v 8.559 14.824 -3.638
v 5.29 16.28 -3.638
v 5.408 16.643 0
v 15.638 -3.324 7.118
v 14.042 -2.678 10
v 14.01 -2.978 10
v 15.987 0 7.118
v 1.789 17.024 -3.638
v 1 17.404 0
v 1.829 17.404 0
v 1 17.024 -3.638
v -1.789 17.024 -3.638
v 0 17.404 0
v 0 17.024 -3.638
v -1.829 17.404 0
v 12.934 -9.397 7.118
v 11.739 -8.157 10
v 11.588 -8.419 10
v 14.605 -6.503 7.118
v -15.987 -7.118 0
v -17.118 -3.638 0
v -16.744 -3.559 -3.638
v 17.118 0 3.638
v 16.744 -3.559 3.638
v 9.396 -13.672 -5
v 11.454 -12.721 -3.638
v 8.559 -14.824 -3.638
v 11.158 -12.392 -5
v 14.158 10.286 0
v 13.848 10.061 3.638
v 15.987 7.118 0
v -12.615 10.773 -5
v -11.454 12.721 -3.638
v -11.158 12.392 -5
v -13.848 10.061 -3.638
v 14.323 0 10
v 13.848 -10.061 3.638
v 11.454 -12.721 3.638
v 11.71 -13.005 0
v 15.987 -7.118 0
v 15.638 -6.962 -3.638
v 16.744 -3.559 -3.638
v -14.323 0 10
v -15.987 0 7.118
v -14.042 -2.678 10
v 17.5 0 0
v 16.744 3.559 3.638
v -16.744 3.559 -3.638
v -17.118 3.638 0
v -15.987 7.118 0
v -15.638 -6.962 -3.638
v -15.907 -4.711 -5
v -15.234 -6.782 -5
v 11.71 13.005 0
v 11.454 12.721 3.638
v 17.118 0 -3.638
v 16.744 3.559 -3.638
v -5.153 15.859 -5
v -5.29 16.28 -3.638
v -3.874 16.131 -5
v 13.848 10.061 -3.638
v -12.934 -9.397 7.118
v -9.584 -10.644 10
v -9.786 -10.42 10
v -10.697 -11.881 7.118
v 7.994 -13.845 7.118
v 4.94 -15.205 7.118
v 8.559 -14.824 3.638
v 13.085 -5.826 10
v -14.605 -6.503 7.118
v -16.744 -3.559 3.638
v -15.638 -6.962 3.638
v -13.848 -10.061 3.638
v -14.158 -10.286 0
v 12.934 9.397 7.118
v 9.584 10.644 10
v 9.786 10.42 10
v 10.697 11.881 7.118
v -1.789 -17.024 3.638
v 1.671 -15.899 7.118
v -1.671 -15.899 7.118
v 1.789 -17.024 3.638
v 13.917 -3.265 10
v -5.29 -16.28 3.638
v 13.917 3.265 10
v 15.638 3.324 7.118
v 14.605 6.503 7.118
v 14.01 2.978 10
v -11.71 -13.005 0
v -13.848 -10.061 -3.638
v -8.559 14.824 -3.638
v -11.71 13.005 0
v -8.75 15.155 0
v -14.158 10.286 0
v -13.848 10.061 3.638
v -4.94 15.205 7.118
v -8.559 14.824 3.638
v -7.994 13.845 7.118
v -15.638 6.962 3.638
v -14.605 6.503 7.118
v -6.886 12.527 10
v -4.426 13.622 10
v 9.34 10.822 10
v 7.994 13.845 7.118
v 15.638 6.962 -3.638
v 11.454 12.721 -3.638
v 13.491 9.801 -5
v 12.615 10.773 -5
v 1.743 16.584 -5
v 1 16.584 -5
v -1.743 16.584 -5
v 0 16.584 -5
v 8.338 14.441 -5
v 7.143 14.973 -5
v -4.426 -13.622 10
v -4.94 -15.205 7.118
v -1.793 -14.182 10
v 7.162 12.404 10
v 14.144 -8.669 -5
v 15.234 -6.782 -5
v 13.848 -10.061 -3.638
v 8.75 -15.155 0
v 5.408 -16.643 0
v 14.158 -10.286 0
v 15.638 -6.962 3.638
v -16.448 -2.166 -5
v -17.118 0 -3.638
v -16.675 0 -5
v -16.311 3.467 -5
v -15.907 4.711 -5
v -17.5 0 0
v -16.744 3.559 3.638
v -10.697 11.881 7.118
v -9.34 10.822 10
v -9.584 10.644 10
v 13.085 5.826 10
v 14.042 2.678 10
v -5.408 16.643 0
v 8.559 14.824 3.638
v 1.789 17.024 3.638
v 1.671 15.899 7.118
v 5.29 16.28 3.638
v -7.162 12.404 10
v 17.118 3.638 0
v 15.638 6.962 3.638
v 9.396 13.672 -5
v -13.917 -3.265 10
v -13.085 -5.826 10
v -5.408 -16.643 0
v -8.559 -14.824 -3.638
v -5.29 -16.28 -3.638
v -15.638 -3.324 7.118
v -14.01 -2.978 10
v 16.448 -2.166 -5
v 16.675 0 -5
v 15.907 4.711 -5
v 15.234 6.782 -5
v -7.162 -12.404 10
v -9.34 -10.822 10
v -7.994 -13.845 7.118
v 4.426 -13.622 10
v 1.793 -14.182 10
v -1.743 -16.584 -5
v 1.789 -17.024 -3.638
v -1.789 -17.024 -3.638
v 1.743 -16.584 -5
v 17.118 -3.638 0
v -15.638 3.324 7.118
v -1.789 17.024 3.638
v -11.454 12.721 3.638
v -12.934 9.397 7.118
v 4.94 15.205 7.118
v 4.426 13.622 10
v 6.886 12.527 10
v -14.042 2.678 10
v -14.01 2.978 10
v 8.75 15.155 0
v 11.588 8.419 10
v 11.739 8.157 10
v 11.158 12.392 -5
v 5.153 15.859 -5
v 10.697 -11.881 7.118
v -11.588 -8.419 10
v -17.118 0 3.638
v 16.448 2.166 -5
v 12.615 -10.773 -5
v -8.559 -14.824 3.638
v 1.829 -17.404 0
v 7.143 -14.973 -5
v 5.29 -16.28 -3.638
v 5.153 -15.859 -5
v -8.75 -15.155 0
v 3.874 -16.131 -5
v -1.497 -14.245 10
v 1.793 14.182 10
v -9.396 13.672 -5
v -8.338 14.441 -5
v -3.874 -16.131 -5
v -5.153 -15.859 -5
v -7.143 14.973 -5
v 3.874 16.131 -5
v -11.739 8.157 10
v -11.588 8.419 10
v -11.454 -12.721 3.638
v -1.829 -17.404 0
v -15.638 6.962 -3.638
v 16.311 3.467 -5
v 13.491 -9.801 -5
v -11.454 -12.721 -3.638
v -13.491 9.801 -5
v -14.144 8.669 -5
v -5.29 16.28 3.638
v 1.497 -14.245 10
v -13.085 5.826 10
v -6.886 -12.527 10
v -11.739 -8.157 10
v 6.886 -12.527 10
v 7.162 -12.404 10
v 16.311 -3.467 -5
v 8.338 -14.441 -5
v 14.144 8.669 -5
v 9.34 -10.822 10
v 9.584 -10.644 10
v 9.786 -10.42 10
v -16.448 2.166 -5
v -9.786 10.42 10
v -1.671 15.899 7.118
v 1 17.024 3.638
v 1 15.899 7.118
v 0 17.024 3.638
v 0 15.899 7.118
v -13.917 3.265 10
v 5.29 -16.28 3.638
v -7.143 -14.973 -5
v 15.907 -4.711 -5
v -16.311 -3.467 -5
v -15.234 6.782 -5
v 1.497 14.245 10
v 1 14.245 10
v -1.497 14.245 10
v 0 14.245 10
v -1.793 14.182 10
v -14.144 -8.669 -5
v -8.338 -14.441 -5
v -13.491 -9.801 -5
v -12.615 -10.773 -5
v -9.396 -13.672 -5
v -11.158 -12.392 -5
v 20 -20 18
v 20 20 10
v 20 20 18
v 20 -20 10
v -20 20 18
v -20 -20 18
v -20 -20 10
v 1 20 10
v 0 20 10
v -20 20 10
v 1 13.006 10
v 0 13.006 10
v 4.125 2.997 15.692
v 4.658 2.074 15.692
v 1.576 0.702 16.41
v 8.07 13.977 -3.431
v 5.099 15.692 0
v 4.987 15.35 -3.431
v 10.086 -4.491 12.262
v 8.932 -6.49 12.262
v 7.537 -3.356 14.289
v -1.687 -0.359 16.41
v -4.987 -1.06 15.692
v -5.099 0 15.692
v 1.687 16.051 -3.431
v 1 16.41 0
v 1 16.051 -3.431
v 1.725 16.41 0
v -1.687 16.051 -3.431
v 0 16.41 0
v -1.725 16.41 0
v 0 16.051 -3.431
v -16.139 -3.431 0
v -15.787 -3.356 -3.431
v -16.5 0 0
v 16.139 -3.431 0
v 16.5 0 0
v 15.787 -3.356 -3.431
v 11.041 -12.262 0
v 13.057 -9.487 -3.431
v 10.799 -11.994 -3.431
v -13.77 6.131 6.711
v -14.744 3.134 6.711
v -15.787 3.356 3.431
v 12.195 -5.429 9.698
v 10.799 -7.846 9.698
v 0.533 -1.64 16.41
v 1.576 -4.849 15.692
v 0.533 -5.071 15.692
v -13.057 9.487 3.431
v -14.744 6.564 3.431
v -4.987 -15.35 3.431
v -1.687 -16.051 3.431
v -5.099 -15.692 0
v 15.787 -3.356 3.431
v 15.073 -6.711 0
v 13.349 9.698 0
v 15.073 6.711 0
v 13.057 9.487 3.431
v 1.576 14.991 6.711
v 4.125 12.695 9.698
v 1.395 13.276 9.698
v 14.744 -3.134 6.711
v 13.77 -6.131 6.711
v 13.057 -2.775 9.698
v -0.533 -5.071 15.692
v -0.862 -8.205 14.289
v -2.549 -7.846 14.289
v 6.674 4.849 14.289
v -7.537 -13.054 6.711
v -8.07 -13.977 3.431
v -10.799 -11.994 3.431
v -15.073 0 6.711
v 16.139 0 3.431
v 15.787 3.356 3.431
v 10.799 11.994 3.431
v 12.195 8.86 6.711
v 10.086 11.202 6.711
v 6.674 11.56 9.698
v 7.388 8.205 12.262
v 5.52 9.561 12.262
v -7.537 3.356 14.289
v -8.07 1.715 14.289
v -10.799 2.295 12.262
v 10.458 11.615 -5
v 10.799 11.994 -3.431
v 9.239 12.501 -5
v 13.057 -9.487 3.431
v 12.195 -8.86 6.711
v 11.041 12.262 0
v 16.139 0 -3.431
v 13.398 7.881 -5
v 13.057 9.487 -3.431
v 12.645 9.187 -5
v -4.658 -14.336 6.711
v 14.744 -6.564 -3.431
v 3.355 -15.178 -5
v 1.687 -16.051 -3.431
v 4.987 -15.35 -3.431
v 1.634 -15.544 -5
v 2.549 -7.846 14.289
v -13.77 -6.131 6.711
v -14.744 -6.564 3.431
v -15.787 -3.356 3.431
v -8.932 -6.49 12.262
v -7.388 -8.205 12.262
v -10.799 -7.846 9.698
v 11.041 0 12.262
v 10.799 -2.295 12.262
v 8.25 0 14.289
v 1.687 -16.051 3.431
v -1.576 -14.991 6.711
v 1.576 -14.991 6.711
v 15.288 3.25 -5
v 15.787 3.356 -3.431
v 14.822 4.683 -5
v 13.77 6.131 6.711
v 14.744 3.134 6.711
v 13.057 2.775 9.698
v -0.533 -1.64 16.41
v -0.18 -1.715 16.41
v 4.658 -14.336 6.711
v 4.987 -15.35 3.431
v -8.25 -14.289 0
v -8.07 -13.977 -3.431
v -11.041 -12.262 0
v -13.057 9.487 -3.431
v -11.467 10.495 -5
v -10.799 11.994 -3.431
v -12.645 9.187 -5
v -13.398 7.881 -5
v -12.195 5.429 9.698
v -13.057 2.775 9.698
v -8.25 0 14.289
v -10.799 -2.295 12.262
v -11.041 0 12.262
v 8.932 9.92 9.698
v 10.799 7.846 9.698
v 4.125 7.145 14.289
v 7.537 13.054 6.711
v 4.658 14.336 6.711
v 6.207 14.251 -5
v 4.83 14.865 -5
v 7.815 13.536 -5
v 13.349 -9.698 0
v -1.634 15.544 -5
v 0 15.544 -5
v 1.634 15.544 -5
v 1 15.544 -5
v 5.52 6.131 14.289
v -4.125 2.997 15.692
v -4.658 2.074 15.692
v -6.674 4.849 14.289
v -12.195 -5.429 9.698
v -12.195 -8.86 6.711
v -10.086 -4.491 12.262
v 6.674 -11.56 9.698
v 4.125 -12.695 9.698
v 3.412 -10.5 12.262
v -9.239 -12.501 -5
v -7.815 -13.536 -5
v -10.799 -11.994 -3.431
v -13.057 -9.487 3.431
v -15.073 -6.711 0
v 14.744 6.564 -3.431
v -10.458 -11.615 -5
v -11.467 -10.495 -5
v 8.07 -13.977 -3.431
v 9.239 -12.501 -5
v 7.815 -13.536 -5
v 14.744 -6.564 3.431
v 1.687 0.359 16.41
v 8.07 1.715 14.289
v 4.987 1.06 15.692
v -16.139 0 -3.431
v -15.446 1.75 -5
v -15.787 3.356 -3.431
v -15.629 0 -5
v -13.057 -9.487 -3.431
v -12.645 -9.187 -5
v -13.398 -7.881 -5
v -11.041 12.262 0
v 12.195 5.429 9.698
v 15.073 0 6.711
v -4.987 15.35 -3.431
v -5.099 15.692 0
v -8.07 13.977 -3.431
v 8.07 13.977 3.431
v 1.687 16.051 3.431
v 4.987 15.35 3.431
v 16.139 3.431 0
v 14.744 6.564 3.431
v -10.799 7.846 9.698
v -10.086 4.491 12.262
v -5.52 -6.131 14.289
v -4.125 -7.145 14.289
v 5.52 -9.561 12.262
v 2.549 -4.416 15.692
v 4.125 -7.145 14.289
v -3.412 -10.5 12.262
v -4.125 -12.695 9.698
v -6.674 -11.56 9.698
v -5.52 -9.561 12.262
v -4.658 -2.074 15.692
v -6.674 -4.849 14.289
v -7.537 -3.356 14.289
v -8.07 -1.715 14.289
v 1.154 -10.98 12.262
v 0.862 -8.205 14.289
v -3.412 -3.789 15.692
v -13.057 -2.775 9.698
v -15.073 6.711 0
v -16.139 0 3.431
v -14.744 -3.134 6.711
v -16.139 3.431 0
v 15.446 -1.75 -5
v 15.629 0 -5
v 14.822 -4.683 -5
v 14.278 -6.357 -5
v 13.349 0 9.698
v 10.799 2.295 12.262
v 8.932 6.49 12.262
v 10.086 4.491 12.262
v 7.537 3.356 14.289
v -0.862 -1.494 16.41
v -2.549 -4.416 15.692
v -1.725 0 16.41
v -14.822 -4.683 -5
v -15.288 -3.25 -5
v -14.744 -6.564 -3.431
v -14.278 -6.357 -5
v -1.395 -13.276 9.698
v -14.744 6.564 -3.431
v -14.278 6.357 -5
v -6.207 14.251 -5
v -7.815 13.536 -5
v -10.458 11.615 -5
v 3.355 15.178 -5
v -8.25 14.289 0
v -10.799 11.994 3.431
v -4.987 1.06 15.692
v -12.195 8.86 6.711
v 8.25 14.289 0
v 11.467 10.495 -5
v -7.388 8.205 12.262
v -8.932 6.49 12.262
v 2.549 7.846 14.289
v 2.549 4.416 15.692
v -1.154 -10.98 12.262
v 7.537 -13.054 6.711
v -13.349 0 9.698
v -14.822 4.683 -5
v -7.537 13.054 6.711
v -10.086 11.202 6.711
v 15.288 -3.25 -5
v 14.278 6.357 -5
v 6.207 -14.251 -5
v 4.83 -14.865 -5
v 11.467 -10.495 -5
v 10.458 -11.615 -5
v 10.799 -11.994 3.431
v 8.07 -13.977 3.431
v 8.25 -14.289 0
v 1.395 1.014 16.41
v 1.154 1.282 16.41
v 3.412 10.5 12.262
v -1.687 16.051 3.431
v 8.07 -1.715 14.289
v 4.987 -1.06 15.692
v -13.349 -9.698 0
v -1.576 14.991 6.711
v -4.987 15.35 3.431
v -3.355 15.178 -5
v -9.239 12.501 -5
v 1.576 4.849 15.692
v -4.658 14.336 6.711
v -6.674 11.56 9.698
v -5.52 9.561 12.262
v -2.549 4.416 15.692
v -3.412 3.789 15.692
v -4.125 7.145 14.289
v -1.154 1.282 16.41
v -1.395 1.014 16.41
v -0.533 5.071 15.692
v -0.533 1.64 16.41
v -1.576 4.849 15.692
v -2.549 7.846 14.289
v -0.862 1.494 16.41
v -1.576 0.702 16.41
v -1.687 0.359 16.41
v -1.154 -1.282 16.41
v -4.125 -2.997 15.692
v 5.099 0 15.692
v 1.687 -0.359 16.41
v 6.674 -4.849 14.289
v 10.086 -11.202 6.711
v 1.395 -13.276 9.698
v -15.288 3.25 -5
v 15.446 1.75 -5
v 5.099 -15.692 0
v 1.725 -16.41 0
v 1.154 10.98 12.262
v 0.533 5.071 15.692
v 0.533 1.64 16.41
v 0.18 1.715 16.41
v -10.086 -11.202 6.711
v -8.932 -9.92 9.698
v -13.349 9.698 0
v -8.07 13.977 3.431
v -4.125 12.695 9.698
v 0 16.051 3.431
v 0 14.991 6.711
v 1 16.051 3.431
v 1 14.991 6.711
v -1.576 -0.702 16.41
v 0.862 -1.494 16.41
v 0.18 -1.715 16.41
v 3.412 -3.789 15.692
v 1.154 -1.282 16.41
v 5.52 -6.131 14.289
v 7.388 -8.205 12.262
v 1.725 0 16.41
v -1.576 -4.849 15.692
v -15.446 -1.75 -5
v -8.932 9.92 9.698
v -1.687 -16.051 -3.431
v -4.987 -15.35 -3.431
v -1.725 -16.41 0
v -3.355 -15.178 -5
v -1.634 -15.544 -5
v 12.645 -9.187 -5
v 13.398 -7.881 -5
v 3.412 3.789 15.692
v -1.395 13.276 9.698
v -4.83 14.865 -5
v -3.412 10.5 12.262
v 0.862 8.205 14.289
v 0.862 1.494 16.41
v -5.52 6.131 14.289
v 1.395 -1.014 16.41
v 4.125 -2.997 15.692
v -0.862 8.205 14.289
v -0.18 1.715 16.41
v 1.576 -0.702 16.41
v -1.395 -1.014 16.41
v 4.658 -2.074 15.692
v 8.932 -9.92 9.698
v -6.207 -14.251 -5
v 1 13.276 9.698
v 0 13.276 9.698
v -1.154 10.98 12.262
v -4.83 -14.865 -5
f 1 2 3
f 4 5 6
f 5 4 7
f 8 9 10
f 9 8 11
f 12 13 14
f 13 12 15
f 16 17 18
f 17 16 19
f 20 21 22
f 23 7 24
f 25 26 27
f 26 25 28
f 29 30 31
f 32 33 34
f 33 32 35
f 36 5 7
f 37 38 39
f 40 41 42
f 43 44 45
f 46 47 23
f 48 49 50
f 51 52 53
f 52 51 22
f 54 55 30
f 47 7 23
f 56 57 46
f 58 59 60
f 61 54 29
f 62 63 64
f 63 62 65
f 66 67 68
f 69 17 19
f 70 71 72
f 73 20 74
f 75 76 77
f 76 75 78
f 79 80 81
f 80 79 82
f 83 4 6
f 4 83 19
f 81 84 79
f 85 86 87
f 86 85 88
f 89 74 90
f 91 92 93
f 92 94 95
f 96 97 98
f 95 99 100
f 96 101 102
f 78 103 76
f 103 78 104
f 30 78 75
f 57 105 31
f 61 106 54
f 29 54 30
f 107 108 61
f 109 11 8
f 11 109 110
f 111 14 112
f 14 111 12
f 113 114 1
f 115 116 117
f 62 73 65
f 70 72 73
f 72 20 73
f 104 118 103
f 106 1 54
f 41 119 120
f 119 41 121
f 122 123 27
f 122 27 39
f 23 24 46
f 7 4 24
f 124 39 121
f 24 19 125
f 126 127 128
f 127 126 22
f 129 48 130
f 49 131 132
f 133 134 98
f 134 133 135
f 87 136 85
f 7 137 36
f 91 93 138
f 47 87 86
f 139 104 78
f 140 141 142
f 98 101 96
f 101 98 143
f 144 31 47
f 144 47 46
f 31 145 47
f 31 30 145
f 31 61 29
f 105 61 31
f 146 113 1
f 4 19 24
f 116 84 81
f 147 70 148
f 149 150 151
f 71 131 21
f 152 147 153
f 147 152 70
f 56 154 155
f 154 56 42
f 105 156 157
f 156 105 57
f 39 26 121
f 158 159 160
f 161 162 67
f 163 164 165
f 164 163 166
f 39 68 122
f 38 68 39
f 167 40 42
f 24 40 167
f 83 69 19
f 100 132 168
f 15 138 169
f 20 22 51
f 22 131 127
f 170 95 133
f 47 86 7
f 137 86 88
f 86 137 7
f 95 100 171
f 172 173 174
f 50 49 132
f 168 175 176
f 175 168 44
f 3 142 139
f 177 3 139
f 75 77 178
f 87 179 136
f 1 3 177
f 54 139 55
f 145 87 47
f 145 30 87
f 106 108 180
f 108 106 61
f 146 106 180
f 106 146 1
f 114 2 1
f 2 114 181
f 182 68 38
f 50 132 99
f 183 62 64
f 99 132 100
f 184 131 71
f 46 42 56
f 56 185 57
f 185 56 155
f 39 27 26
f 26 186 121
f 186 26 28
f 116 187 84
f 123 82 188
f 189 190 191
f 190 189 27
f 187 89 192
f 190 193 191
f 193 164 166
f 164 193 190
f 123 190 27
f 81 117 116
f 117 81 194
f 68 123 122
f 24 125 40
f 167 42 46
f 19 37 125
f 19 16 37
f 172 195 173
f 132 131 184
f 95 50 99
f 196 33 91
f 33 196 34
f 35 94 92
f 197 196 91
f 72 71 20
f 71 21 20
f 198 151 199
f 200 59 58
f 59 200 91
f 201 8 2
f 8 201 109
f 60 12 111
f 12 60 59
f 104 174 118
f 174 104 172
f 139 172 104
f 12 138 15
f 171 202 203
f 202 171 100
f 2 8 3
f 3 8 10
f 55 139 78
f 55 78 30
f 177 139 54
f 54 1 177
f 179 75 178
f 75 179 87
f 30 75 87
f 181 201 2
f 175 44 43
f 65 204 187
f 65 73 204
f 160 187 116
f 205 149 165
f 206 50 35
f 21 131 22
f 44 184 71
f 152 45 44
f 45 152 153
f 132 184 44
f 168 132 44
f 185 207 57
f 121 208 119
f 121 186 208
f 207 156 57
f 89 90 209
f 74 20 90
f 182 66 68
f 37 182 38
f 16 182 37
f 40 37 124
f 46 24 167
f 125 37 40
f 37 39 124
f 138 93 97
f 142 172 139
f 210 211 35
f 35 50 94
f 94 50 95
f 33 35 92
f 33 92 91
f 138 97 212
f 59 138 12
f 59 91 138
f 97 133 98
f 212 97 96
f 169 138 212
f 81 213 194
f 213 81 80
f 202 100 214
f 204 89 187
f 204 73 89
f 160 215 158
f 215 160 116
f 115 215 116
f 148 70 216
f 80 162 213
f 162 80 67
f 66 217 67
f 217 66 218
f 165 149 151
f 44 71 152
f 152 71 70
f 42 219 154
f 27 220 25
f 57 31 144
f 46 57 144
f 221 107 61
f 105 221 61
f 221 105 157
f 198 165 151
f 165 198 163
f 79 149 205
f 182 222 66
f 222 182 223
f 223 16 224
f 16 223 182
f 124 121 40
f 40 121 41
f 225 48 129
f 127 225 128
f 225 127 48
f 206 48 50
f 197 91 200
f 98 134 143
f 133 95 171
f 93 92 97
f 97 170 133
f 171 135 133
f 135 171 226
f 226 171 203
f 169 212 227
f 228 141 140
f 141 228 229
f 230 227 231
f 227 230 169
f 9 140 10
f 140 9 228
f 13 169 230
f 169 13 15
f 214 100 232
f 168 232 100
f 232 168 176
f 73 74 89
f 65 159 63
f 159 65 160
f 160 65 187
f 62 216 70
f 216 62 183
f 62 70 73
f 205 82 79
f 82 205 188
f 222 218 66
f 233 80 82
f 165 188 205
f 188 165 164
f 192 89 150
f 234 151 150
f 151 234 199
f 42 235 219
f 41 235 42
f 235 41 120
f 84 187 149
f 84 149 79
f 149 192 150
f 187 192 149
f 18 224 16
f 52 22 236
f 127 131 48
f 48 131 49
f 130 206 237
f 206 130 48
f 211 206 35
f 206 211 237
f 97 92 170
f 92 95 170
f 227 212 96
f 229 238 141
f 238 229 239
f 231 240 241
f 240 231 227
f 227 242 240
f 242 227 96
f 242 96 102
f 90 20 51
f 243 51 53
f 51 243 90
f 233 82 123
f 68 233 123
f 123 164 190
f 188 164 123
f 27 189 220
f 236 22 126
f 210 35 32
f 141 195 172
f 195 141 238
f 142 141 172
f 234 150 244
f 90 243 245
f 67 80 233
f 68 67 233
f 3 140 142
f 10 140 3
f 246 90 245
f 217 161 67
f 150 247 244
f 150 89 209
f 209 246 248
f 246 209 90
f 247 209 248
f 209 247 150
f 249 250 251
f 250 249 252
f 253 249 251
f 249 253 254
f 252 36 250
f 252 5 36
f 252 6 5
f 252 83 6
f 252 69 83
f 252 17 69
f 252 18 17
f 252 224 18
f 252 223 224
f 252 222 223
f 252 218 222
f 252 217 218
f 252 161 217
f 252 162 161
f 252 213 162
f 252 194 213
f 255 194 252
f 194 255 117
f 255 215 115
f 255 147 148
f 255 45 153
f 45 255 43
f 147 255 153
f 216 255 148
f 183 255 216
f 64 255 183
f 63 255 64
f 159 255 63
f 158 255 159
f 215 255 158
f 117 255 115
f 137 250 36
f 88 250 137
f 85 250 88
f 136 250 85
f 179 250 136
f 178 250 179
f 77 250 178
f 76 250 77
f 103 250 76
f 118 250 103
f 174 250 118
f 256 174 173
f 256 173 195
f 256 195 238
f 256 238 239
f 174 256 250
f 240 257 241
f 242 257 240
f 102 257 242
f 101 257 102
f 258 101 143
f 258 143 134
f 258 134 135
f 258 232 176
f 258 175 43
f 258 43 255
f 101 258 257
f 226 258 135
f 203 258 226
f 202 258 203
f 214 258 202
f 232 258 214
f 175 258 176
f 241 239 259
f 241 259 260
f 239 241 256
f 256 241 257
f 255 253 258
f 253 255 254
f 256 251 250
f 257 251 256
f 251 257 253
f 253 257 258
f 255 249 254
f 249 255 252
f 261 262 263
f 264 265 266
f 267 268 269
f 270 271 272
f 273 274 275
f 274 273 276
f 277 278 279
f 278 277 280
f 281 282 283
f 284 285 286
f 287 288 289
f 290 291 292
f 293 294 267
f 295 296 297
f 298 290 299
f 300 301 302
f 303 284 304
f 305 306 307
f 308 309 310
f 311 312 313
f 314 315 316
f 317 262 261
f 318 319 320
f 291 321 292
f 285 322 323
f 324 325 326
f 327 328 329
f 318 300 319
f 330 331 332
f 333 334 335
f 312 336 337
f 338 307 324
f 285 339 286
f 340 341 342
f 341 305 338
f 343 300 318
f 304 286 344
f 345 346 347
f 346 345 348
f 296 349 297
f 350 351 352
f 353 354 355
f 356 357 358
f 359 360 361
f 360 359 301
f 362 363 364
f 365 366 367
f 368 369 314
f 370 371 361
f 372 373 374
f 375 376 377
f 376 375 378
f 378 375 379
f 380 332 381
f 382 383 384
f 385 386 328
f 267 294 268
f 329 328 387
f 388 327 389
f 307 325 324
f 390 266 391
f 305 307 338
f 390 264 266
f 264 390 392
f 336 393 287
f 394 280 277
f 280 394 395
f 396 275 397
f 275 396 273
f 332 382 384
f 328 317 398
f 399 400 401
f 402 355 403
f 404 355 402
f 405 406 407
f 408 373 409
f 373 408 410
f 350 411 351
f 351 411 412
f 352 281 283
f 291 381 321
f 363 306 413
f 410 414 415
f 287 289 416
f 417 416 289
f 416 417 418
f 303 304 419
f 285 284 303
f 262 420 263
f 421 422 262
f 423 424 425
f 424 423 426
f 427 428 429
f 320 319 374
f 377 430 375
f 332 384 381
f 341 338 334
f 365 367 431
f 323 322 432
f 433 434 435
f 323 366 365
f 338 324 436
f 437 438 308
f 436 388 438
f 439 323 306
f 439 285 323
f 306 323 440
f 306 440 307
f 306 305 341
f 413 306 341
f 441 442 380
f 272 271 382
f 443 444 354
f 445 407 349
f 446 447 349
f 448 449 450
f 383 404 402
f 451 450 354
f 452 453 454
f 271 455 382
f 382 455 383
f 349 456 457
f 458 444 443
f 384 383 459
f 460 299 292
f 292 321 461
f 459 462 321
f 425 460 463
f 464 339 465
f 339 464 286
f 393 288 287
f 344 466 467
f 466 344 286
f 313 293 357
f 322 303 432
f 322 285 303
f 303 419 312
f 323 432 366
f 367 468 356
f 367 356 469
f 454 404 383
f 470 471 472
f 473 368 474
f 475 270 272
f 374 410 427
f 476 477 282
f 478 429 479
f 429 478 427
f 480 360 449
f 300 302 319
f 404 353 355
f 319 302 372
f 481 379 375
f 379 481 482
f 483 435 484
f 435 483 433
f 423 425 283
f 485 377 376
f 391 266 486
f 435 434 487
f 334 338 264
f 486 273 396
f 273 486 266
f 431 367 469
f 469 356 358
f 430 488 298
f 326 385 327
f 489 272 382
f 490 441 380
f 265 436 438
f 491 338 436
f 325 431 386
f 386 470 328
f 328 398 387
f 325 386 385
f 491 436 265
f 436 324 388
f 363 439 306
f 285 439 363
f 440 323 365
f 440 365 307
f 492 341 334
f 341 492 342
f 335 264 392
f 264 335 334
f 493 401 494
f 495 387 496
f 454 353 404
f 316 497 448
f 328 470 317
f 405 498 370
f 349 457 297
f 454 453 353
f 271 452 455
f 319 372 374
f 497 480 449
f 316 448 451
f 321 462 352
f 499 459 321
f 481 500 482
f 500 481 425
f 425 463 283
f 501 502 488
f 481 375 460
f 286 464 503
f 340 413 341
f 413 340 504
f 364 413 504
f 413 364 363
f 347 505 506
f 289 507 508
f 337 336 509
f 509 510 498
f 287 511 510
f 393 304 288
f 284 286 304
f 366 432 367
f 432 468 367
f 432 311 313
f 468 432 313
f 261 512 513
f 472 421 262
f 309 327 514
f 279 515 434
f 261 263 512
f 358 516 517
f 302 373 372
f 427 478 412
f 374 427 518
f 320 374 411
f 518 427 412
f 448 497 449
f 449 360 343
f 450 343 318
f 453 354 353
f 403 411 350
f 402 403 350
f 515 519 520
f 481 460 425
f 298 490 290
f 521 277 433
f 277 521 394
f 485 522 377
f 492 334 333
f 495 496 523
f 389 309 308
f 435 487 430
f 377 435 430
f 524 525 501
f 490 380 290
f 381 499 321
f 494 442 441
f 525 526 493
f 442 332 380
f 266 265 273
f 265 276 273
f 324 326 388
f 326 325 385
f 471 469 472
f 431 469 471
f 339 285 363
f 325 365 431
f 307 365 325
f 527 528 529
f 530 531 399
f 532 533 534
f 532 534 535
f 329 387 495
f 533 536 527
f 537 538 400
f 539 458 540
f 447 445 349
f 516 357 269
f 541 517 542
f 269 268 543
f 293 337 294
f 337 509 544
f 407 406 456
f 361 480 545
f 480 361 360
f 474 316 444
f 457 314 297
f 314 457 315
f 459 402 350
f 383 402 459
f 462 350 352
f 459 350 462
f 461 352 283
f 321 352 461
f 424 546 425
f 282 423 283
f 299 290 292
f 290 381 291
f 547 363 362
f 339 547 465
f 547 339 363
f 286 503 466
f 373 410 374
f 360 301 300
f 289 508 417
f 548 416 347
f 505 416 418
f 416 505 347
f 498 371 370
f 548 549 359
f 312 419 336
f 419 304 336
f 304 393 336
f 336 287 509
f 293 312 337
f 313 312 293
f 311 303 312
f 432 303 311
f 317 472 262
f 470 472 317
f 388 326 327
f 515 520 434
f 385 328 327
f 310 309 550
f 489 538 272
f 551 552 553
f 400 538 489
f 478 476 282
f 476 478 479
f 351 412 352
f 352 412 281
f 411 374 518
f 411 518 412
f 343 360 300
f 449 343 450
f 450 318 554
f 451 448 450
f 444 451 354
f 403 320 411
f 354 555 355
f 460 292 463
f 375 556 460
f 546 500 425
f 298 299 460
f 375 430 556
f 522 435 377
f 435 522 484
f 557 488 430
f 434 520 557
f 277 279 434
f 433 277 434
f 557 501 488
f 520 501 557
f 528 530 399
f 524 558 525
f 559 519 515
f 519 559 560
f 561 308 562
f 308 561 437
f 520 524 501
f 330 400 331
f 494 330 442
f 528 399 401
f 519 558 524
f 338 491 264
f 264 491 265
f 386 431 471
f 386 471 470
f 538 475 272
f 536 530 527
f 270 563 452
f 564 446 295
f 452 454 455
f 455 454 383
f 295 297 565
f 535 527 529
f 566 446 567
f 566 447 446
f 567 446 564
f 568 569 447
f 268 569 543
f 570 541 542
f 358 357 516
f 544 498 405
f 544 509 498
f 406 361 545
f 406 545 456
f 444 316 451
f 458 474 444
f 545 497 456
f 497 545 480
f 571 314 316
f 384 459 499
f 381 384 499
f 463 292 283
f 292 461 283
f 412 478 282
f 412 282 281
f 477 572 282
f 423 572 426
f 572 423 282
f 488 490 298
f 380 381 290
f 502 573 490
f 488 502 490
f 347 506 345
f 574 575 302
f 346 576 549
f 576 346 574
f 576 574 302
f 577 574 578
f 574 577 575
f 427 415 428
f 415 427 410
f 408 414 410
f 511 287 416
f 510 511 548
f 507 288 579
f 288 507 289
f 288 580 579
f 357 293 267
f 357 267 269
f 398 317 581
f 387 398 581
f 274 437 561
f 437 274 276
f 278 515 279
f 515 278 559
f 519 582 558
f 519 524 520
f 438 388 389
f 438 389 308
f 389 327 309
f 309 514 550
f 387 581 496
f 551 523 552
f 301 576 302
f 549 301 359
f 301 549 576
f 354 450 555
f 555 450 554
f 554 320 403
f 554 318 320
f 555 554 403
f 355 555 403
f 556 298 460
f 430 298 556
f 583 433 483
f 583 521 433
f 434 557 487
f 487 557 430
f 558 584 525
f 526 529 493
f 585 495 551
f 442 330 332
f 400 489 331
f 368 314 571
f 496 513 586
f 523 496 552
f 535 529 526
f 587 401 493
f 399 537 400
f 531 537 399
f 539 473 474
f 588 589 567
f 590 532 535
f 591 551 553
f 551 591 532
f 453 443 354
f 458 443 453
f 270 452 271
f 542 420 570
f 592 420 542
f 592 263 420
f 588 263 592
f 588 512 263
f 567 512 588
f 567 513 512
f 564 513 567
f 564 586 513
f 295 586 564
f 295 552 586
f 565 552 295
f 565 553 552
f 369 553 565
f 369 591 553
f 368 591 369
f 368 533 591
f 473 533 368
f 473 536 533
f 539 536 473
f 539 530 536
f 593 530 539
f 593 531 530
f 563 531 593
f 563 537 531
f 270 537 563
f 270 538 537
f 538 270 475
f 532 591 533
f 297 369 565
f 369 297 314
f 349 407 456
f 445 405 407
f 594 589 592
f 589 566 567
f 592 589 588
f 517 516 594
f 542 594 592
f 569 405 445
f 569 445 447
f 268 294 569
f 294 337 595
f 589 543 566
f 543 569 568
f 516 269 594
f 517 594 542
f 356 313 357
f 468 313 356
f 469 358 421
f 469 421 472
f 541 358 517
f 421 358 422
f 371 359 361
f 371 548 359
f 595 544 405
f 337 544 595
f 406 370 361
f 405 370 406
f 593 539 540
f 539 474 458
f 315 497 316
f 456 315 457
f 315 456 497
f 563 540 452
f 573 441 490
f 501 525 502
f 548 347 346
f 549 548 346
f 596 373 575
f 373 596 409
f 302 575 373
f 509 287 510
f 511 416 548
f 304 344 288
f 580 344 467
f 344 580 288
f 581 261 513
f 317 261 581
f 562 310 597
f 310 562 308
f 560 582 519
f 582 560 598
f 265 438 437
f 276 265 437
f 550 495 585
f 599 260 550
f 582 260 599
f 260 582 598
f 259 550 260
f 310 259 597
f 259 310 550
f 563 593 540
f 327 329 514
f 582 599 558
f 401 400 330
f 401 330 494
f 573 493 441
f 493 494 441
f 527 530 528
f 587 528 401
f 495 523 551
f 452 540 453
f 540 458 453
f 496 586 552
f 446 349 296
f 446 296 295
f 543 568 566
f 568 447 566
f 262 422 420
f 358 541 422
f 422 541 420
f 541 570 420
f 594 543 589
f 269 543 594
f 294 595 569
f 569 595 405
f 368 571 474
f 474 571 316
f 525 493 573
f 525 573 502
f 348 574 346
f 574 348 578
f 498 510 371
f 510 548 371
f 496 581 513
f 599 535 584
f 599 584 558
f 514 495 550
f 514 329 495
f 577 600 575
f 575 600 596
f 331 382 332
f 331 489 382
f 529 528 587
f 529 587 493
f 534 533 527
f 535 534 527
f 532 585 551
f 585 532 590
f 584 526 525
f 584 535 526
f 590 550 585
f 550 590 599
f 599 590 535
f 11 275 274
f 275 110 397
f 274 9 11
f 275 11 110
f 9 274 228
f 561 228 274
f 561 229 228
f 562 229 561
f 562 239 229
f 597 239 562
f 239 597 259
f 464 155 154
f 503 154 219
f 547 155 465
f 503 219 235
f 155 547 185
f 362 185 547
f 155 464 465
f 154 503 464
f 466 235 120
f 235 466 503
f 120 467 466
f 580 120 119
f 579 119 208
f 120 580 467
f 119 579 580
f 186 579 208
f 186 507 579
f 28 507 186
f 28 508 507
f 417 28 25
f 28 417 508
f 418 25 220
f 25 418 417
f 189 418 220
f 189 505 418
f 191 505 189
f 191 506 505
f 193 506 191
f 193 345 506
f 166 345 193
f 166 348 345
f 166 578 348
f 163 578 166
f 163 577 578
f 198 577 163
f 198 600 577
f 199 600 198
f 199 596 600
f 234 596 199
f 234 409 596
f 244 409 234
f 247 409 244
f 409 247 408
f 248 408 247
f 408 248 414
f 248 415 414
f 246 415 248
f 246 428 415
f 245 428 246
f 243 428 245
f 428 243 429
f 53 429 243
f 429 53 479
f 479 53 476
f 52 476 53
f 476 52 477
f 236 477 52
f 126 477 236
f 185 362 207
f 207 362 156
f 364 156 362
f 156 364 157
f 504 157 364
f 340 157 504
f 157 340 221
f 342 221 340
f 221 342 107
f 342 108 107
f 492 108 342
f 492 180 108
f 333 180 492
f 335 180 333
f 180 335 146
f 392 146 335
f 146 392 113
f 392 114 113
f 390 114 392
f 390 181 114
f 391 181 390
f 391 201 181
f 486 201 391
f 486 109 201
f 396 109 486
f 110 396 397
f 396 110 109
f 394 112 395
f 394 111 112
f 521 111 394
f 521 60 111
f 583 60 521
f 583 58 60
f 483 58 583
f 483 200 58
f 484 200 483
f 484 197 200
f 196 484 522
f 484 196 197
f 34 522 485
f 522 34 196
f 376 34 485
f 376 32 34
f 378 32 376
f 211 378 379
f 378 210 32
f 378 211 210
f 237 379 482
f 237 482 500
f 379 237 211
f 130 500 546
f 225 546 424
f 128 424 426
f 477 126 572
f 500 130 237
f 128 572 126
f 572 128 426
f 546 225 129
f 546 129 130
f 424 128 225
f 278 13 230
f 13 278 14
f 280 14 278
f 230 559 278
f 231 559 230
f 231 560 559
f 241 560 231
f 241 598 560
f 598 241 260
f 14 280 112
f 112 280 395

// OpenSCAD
difference(){
	union(){
		sphere(d=35);
		translate([-20,-20,10])
		cube([40,40,8]);
	}
	sphere(d=33);
	translate([0,0,-5])
	cube([1,20,15]);
	translate([-20,-20,-25])
	cube([40,40,20]);
}
